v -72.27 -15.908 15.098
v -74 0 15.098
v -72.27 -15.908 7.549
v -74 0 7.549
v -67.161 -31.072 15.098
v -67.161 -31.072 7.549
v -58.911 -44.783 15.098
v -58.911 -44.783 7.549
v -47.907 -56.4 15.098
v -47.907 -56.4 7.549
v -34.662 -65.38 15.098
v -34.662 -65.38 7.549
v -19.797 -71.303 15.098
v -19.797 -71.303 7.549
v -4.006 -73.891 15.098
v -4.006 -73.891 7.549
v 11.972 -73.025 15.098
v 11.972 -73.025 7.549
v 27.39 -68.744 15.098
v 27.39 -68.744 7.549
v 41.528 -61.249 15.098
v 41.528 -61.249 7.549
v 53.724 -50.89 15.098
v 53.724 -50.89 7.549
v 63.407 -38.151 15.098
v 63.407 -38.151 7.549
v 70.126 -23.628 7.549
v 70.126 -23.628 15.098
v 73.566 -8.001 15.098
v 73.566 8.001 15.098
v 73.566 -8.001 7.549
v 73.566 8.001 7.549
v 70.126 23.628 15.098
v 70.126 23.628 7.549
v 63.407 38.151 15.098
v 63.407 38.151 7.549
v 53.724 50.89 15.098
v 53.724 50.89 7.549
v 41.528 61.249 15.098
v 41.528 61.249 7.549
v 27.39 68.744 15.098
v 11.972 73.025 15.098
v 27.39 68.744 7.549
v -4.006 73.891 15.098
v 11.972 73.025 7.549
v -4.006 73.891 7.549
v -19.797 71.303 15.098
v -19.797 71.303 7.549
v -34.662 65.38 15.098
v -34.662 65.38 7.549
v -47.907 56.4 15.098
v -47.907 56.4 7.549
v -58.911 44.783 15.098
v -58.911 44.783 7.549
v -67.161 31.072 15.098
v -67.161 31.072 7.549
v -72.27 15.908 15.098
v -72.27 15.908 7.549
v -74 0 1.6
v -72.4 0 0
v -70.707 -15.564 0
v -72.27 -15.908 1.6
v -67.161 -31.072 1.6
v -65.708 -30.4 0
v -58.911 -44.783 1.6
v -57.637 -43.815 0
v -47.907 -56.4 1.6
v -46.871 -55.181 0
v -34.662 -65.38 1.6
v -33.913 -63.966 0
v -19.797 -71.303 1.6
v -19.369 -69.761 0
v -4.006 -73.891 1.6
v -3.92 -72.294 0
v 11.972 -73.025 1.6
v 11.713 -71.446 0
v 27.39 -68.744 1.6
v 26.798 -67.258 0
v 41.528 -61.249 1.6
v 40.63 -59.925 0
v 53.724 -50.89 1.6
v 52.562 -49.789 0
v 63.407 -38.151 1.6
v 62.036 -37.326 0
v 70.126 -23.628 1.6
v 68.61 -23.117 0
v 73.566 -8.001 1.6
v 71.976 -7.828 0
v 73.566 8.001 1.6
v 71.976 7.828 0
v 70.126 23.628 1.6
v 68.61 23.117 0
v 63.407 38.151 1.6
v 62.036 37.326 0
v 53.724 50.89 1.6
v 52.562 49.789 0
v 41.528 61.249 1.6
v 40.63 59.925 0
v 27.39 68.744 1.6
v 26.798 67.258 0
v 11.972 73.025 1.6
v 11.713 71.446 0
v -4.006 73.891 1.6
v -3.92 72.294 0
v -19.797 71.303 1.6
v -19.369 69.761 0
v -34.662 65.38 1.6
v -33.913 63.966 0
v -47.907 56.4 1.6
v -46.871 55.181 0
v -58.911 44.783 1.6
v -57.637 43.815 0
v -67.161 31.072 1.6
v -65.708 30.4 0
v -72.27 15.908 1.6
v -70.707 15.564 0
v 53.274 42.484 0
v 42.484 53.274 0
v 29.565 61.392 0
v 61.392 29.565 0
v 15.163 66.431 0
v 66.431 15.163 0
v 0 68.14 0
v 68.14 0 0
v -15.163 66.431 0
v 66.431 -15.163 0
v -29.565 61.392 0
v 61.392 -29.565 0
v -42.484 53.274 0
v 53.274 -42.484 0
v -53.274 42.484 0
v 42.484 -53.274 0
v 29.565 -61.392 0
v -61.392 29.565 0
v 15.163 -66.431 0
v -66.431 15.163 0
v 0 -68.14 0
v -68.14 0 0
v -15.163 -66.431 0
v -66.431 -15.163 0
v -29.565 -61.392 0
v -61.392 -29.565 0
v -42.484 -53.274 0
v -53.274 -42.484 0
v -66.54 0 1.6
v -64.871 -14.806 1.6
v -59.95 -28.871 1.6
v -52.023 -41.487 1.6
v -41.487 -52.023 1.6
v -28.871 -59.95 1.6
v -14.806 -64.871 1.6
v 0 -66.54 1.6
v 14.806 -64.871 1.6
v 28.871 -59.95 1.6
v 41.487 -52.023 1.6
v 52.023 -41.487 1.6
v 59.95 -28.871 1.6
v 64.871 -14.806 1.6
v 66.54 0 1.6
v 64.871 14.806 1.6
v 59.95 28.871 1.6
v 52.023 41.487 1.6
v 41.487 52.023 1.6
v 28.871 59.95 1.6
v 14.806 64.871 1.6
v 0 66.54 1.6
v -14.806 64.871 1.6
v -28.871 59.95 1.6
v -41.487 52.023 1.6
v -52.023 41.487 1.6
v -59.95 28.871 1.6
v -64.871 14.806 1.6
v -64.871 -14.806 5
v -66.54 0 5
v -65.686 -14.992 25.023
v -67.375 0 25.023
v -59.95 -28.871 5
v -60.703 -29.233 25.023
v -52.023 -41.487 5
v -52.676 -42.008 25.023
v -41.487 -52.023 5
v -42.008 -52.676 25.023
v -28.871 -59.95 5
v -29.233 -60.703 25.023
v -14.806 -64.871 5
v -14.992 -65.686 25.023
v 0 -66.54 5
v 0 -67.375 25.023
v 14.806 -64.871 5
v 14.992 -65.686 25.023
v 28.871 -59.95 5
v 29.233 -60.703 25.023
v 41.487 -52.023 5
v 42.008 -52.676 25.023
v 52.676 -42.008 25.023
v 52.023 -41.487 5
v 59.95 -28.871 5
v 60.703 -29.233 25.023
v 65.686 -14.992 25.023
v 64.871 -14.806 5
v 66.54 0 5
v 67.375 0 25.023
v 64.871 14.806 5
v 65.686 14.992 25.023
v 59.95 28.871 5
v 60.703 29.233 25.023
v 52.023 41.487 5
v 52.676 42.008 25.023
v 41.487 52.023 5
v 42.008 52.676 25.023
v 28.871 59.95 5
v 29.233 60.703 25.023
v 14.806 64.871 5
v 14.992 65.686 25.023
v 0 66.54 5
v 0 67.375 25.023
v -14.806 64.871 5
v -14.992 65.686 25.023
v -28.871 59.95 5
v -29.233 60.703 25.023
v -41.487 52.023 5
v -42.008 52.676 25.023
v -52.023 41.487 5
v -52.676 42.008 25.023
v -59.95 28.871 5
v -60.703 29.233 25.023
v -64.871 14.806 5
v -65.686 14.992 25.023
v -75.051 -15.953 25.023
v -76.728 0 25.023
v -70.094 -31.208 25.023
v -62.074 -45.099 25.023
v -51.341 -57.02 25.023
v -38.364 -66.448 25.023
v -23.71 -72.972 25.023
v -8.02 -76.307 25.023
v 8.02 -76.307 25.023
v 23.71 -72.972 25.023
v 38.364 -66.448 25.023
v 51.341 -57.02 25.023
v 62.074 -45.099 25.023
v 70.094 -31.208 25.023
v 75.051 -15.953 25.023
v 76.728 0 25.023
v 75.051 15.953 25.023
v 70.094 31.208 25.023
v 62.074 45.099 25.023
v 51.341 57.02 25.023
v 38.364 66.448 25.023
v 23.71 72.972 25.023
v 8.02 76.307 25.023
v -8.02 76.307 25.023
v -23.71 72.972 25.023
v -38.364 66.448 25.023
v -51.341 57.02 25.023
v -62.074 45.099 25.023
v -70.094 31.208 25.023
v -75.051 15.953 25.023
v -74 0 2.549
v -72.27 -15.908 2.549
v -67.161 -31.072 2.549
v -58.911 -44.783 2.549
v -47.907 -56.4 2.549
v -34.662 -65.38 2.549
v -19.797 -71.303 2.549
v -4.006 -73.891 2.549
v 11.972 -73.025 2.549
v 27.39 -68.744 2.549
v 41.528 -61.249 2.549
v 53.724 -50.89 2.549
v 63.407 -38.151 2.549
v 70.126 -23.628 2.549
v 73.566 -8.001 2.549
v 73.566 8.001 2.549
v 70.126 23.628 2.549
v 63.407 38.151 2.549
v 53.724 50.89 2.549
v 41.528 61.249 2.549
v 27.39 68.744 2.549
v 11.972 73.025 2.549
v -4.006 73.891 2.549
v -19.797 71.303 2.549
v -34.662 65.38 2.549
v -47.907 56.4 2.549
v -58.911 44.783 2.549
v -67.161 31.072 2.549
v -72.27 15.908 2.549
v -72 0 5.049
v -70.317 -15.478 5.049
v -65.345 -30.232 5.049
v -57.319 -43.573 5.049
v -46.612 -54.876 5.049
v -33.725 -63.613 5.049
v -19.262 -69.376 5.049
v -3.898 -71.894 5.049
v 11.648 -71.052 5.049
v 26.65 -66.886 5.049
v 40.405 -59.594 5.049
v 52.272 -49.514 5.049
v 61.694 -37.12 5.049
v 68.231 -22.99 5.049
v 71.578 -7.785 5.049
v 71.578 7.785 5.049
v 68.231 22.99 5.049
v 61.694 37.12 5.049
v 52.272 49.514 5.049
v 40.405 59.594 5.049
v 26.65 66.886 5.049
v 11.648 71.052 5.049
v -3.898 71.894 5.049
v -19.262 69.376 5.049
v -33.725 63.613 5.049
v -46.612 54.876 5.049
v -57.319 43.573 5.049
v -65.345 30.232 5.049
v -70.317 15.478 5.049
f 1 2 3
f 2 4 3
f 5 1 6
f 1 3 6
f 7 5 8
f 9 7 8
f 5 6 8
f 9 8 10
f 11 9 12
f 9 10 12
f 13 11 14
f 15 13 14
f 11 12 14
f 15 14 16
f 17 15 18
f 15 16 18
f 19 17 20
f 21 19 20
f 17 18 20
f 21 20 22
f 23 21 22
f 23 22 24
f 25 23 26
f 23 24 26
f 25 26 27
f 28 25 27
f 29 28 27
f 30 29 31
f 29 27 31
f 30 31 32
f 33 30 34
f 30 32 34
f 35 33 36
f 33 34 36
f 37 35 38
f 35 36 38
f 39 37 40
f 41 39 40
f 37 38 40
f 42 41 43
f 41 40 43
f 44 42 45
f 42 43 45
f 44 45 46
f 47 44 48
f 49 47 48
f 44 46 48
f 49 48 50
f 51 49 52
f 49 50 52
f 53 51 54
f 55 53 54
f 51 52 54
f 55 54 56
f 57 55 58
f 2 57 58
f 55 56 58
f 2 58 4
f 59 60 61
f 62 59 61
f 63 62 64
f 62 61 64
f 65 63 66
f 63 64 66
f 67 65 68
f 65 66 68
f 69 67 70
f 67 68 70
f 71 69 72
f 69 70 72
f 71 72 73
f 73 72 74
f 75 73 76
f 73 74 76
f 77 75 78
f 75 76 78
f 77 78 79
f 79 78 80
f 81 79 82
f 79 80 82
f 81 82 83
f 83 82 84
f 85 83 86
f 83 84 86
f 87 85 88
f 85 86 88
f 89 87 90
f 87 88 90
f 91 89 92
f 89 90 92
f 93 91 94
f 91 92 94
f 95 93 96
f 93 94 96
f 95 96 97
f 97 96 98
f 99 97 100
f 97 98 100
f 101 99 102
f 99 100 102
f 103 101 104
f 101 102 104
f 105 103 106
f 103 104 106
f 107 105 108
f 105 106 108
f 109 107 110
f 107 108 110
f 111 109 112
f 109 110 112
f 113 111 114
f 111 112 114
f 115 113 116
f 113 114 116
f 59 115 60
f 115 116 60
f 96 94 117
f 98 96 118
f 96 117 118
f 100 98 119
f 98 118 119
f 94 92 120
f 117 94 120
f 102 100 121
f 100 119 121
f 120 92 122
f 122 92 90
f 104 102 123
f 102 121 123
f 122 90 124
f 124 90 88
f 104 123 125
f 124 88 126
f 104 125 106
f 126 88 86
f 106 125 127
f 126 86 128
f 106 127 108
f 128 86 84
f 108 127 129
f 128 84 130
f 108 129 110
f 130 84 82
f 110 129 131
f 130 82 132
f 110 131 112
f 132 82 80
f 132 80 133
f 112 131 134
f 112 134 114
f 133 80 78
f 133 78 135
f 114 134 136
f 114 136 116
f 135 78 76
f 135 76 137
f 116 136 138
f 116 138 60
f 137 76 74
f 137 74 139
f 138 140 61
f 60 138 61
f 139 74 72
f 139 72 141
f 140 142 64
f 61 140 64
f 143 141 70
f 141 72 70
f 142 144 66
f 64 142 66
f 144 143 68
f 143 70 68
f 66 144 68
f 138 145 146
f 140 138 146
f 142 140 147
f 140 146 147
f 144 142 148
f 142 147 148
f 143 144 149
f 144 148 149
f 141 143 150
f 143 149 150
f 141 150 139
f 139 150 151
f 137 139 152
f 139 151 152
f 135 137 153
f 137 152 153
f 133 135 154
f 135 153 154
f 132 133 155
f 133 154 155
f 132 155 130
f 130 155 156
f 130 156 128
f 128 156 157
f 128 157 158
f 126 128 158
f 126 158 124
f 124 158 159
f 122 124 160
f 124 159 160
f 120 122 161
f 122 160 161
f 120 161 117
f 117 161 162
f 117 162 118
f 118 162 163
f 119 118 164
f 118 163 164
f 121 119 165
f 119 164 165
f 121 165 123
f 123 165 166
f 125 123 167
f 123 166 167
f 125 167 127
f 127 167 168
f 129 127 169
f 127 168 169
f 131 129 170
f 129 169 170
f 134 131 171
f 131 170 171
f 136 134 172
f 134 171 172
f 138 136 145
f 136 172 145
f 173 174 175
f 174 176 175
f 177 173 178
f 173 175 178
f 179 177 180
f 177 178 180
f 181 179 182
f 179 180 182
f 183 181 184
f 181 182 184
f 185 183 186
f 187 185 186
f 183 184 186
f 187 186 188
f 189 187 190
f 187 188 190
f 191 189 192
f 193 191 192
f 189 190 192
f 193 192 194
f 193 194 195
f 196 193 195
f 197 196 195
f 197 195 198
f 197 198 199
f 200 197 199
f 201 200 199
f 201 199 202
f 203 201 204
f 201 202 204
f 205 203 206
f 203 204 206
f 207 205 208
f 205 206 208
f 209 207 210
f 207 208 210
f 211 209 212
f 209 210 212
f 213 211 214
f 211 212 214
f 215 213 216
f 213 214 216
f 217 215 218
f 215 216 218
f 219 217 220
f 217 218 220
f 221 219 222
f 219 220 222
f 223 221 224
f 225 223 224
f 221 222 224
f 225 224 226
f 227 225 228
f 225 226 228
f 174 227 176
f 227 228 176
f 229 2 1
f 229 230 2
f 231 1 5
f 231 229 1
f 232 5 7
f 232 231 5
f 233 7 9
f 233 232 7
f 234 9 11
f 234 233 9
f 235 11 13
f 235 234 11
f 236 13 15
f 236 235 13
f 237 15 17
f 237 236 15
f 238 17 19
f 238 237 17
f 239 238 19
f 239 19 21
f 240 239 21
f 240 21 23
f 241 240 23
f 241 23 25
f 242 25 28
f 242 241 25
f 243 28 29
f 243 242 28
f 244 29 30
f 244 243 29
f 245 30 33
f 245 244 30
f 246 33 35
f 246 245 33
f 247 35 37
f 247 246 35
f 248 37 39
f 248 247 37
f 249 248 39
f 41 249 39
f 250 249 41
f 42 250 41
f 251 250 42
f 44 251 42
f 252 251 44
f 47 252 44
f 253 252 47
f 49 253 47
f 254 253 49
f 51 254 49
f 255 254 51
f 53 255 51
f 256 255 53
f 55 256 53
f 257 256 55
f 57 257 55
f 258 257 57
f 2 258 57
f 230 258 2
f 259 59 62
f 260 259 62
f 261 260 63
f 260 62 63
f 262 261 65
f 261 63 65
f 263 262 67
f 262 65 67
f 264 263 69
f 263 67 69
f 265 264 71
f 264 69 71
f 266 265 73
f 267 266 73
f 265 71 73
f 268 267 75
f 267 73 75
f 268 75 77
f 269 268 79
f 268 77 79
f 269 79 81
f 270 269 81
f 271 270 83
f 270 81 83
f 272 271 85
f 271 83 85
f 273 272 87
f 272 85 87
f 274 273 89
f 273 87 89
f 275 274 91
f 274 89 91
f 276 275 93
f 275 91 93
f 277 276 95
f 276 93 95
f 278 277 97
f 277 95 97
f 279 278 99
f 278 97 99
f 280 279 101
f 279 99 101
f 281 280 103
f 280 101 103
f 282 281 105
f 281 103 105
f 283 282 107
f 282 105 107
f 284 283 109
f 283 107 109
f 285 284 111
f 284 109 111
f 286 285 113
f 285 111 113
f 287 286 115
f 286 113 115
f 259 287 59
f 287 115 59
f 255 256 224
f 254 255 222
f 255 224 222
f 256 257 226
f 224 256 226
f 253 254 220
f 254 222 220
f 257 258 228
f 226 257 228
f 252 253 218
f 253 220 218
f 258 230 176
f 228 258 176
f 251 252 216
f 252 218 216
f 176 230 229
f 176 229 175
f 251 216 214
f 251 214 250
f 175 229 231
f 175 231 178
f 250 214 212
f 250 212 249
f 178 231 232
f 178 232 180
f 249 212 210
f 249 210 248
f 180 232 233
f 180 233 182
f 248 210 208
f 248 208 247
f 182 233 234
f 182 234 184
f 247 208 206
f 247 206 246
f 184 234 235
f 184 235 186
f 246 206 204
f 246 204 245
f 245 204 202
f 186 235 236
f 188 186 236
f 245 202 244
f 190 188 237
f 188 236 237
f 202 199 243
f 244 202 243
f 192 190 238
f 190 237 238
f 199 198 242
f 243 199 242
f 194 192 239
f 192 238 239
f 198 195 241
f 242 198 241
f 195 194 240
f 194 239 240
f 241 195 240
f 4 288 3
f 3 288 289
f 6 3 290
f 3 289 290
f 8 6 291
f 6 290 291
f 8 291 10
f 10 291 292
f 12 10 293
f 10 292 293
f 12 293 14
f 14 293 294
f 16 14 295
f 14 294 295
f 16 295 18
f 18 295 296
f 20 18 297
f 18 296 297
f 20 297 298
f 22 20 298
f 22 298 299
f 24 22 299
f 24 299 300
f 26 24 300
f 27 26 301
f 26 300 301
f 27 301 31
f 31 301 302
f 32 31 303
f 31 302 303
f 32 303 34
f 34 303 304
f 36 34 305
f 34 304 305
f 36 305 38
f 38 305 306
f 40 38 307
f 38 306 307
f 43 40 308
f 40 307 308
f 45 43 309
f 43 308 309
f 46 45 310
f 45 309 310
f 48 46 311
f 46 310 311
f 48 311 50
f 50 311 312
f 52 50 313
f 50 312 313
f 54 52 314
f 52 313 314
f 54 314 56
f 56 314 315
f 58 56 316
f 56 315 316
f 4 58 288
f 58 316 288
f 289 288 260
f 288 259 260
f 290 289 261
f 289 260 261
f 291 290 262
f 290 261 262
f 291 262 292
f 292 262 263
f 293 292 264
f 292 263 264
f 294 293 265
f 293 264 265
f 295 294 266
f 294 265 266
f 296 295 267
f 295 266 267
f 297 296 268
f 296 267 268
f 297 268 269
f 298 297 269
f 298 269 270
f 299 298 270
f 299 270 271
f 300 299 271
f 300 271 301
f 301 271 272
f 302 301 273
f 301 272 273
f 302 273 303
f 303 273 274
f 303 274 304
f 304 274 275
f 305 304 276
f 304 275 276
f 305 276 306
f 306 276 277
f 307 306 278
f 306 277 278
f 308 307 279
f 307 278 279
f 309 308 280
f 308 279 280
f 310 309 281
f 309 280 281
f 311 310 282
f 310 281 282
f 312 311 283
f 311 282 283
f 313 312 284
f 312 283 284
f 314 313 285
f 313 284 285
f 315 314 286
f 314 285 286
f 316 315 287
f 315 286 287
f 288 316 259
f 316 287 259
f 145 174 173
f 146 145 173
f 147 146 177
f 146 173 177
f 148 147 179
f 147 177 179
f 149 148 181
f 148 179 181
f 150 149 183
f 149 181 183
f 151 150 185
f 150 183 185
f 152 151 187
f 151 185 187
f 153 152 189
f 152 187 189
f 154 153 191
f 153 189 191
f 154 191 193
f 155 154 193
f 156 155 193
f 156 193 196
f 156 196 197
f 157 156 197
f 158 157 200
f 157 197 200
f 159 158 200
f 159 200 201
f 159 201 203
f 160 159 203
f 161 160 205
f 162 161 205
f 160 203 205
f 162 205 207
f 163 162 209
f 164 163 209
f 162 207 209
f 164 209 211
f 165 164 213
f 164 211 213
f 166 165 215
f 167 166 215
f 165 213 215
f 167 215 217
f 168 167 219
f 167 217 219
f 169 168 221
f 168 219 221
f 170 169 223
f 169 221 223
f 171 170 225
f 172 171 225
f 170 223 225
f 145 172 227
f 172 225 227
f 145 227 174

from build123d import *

# Parameters (mm, degrees)
F2_SIZE = 1.6


# Not quite as in the source:
# - a feature names something its author has since deleted; it is built from what else it names


with BuildPart() as f1:
    # F0 (on Front) → F1 (revolve)
    with BuildSketch(Plane.XZ):
        with BuildLine():
            Line((-74, 2.5490417611), (-74, 0))
            Line((-74, 0), (-67, 0))
            Line((-67, 0), (-66.5397158787, 0))
            Line((-66.5397158787, 0), (-66.5397158787, 5))
            Line((-66.5397158787, 5), (-67.375109026, 25.0225278729))
            Line((-67.375109026, 25.0225278729), (-76.7276180841, 25.0225278729))
            add(Edge.make_bspline(
                [(-74, 15.0980835222), (-74.5290090501, 18.1522390297), (-75.5065289435, 21.7678404443), (-76.7276180841, 25.0225278729)],
                knots=[0, 0, 0, 0, 0.3708554891, 0.3708554891, 0.3708554891, 0.3708554891], degree=3))
            Line((-74, 15.0980835222), (-74, 7.5490417611))
            Line((-74, 7.5490417611), (-72, 5.0490417611))
            Line((-72, 5.0490417611), (-74, 2.5490417611))
        make_face()
    revolve(axis=Axis((0, 0, 30.7617206126), (0, 0, 1)))

    # F2
    f2_edges = [f1.edges().sort_by_distance(p)[0] for p in [
        (74, 0, 0),
        (66.539716, 0, 0),
    ]]
    chamfer(f2_edges, length=F2_SIZE)


solid = f1.part
